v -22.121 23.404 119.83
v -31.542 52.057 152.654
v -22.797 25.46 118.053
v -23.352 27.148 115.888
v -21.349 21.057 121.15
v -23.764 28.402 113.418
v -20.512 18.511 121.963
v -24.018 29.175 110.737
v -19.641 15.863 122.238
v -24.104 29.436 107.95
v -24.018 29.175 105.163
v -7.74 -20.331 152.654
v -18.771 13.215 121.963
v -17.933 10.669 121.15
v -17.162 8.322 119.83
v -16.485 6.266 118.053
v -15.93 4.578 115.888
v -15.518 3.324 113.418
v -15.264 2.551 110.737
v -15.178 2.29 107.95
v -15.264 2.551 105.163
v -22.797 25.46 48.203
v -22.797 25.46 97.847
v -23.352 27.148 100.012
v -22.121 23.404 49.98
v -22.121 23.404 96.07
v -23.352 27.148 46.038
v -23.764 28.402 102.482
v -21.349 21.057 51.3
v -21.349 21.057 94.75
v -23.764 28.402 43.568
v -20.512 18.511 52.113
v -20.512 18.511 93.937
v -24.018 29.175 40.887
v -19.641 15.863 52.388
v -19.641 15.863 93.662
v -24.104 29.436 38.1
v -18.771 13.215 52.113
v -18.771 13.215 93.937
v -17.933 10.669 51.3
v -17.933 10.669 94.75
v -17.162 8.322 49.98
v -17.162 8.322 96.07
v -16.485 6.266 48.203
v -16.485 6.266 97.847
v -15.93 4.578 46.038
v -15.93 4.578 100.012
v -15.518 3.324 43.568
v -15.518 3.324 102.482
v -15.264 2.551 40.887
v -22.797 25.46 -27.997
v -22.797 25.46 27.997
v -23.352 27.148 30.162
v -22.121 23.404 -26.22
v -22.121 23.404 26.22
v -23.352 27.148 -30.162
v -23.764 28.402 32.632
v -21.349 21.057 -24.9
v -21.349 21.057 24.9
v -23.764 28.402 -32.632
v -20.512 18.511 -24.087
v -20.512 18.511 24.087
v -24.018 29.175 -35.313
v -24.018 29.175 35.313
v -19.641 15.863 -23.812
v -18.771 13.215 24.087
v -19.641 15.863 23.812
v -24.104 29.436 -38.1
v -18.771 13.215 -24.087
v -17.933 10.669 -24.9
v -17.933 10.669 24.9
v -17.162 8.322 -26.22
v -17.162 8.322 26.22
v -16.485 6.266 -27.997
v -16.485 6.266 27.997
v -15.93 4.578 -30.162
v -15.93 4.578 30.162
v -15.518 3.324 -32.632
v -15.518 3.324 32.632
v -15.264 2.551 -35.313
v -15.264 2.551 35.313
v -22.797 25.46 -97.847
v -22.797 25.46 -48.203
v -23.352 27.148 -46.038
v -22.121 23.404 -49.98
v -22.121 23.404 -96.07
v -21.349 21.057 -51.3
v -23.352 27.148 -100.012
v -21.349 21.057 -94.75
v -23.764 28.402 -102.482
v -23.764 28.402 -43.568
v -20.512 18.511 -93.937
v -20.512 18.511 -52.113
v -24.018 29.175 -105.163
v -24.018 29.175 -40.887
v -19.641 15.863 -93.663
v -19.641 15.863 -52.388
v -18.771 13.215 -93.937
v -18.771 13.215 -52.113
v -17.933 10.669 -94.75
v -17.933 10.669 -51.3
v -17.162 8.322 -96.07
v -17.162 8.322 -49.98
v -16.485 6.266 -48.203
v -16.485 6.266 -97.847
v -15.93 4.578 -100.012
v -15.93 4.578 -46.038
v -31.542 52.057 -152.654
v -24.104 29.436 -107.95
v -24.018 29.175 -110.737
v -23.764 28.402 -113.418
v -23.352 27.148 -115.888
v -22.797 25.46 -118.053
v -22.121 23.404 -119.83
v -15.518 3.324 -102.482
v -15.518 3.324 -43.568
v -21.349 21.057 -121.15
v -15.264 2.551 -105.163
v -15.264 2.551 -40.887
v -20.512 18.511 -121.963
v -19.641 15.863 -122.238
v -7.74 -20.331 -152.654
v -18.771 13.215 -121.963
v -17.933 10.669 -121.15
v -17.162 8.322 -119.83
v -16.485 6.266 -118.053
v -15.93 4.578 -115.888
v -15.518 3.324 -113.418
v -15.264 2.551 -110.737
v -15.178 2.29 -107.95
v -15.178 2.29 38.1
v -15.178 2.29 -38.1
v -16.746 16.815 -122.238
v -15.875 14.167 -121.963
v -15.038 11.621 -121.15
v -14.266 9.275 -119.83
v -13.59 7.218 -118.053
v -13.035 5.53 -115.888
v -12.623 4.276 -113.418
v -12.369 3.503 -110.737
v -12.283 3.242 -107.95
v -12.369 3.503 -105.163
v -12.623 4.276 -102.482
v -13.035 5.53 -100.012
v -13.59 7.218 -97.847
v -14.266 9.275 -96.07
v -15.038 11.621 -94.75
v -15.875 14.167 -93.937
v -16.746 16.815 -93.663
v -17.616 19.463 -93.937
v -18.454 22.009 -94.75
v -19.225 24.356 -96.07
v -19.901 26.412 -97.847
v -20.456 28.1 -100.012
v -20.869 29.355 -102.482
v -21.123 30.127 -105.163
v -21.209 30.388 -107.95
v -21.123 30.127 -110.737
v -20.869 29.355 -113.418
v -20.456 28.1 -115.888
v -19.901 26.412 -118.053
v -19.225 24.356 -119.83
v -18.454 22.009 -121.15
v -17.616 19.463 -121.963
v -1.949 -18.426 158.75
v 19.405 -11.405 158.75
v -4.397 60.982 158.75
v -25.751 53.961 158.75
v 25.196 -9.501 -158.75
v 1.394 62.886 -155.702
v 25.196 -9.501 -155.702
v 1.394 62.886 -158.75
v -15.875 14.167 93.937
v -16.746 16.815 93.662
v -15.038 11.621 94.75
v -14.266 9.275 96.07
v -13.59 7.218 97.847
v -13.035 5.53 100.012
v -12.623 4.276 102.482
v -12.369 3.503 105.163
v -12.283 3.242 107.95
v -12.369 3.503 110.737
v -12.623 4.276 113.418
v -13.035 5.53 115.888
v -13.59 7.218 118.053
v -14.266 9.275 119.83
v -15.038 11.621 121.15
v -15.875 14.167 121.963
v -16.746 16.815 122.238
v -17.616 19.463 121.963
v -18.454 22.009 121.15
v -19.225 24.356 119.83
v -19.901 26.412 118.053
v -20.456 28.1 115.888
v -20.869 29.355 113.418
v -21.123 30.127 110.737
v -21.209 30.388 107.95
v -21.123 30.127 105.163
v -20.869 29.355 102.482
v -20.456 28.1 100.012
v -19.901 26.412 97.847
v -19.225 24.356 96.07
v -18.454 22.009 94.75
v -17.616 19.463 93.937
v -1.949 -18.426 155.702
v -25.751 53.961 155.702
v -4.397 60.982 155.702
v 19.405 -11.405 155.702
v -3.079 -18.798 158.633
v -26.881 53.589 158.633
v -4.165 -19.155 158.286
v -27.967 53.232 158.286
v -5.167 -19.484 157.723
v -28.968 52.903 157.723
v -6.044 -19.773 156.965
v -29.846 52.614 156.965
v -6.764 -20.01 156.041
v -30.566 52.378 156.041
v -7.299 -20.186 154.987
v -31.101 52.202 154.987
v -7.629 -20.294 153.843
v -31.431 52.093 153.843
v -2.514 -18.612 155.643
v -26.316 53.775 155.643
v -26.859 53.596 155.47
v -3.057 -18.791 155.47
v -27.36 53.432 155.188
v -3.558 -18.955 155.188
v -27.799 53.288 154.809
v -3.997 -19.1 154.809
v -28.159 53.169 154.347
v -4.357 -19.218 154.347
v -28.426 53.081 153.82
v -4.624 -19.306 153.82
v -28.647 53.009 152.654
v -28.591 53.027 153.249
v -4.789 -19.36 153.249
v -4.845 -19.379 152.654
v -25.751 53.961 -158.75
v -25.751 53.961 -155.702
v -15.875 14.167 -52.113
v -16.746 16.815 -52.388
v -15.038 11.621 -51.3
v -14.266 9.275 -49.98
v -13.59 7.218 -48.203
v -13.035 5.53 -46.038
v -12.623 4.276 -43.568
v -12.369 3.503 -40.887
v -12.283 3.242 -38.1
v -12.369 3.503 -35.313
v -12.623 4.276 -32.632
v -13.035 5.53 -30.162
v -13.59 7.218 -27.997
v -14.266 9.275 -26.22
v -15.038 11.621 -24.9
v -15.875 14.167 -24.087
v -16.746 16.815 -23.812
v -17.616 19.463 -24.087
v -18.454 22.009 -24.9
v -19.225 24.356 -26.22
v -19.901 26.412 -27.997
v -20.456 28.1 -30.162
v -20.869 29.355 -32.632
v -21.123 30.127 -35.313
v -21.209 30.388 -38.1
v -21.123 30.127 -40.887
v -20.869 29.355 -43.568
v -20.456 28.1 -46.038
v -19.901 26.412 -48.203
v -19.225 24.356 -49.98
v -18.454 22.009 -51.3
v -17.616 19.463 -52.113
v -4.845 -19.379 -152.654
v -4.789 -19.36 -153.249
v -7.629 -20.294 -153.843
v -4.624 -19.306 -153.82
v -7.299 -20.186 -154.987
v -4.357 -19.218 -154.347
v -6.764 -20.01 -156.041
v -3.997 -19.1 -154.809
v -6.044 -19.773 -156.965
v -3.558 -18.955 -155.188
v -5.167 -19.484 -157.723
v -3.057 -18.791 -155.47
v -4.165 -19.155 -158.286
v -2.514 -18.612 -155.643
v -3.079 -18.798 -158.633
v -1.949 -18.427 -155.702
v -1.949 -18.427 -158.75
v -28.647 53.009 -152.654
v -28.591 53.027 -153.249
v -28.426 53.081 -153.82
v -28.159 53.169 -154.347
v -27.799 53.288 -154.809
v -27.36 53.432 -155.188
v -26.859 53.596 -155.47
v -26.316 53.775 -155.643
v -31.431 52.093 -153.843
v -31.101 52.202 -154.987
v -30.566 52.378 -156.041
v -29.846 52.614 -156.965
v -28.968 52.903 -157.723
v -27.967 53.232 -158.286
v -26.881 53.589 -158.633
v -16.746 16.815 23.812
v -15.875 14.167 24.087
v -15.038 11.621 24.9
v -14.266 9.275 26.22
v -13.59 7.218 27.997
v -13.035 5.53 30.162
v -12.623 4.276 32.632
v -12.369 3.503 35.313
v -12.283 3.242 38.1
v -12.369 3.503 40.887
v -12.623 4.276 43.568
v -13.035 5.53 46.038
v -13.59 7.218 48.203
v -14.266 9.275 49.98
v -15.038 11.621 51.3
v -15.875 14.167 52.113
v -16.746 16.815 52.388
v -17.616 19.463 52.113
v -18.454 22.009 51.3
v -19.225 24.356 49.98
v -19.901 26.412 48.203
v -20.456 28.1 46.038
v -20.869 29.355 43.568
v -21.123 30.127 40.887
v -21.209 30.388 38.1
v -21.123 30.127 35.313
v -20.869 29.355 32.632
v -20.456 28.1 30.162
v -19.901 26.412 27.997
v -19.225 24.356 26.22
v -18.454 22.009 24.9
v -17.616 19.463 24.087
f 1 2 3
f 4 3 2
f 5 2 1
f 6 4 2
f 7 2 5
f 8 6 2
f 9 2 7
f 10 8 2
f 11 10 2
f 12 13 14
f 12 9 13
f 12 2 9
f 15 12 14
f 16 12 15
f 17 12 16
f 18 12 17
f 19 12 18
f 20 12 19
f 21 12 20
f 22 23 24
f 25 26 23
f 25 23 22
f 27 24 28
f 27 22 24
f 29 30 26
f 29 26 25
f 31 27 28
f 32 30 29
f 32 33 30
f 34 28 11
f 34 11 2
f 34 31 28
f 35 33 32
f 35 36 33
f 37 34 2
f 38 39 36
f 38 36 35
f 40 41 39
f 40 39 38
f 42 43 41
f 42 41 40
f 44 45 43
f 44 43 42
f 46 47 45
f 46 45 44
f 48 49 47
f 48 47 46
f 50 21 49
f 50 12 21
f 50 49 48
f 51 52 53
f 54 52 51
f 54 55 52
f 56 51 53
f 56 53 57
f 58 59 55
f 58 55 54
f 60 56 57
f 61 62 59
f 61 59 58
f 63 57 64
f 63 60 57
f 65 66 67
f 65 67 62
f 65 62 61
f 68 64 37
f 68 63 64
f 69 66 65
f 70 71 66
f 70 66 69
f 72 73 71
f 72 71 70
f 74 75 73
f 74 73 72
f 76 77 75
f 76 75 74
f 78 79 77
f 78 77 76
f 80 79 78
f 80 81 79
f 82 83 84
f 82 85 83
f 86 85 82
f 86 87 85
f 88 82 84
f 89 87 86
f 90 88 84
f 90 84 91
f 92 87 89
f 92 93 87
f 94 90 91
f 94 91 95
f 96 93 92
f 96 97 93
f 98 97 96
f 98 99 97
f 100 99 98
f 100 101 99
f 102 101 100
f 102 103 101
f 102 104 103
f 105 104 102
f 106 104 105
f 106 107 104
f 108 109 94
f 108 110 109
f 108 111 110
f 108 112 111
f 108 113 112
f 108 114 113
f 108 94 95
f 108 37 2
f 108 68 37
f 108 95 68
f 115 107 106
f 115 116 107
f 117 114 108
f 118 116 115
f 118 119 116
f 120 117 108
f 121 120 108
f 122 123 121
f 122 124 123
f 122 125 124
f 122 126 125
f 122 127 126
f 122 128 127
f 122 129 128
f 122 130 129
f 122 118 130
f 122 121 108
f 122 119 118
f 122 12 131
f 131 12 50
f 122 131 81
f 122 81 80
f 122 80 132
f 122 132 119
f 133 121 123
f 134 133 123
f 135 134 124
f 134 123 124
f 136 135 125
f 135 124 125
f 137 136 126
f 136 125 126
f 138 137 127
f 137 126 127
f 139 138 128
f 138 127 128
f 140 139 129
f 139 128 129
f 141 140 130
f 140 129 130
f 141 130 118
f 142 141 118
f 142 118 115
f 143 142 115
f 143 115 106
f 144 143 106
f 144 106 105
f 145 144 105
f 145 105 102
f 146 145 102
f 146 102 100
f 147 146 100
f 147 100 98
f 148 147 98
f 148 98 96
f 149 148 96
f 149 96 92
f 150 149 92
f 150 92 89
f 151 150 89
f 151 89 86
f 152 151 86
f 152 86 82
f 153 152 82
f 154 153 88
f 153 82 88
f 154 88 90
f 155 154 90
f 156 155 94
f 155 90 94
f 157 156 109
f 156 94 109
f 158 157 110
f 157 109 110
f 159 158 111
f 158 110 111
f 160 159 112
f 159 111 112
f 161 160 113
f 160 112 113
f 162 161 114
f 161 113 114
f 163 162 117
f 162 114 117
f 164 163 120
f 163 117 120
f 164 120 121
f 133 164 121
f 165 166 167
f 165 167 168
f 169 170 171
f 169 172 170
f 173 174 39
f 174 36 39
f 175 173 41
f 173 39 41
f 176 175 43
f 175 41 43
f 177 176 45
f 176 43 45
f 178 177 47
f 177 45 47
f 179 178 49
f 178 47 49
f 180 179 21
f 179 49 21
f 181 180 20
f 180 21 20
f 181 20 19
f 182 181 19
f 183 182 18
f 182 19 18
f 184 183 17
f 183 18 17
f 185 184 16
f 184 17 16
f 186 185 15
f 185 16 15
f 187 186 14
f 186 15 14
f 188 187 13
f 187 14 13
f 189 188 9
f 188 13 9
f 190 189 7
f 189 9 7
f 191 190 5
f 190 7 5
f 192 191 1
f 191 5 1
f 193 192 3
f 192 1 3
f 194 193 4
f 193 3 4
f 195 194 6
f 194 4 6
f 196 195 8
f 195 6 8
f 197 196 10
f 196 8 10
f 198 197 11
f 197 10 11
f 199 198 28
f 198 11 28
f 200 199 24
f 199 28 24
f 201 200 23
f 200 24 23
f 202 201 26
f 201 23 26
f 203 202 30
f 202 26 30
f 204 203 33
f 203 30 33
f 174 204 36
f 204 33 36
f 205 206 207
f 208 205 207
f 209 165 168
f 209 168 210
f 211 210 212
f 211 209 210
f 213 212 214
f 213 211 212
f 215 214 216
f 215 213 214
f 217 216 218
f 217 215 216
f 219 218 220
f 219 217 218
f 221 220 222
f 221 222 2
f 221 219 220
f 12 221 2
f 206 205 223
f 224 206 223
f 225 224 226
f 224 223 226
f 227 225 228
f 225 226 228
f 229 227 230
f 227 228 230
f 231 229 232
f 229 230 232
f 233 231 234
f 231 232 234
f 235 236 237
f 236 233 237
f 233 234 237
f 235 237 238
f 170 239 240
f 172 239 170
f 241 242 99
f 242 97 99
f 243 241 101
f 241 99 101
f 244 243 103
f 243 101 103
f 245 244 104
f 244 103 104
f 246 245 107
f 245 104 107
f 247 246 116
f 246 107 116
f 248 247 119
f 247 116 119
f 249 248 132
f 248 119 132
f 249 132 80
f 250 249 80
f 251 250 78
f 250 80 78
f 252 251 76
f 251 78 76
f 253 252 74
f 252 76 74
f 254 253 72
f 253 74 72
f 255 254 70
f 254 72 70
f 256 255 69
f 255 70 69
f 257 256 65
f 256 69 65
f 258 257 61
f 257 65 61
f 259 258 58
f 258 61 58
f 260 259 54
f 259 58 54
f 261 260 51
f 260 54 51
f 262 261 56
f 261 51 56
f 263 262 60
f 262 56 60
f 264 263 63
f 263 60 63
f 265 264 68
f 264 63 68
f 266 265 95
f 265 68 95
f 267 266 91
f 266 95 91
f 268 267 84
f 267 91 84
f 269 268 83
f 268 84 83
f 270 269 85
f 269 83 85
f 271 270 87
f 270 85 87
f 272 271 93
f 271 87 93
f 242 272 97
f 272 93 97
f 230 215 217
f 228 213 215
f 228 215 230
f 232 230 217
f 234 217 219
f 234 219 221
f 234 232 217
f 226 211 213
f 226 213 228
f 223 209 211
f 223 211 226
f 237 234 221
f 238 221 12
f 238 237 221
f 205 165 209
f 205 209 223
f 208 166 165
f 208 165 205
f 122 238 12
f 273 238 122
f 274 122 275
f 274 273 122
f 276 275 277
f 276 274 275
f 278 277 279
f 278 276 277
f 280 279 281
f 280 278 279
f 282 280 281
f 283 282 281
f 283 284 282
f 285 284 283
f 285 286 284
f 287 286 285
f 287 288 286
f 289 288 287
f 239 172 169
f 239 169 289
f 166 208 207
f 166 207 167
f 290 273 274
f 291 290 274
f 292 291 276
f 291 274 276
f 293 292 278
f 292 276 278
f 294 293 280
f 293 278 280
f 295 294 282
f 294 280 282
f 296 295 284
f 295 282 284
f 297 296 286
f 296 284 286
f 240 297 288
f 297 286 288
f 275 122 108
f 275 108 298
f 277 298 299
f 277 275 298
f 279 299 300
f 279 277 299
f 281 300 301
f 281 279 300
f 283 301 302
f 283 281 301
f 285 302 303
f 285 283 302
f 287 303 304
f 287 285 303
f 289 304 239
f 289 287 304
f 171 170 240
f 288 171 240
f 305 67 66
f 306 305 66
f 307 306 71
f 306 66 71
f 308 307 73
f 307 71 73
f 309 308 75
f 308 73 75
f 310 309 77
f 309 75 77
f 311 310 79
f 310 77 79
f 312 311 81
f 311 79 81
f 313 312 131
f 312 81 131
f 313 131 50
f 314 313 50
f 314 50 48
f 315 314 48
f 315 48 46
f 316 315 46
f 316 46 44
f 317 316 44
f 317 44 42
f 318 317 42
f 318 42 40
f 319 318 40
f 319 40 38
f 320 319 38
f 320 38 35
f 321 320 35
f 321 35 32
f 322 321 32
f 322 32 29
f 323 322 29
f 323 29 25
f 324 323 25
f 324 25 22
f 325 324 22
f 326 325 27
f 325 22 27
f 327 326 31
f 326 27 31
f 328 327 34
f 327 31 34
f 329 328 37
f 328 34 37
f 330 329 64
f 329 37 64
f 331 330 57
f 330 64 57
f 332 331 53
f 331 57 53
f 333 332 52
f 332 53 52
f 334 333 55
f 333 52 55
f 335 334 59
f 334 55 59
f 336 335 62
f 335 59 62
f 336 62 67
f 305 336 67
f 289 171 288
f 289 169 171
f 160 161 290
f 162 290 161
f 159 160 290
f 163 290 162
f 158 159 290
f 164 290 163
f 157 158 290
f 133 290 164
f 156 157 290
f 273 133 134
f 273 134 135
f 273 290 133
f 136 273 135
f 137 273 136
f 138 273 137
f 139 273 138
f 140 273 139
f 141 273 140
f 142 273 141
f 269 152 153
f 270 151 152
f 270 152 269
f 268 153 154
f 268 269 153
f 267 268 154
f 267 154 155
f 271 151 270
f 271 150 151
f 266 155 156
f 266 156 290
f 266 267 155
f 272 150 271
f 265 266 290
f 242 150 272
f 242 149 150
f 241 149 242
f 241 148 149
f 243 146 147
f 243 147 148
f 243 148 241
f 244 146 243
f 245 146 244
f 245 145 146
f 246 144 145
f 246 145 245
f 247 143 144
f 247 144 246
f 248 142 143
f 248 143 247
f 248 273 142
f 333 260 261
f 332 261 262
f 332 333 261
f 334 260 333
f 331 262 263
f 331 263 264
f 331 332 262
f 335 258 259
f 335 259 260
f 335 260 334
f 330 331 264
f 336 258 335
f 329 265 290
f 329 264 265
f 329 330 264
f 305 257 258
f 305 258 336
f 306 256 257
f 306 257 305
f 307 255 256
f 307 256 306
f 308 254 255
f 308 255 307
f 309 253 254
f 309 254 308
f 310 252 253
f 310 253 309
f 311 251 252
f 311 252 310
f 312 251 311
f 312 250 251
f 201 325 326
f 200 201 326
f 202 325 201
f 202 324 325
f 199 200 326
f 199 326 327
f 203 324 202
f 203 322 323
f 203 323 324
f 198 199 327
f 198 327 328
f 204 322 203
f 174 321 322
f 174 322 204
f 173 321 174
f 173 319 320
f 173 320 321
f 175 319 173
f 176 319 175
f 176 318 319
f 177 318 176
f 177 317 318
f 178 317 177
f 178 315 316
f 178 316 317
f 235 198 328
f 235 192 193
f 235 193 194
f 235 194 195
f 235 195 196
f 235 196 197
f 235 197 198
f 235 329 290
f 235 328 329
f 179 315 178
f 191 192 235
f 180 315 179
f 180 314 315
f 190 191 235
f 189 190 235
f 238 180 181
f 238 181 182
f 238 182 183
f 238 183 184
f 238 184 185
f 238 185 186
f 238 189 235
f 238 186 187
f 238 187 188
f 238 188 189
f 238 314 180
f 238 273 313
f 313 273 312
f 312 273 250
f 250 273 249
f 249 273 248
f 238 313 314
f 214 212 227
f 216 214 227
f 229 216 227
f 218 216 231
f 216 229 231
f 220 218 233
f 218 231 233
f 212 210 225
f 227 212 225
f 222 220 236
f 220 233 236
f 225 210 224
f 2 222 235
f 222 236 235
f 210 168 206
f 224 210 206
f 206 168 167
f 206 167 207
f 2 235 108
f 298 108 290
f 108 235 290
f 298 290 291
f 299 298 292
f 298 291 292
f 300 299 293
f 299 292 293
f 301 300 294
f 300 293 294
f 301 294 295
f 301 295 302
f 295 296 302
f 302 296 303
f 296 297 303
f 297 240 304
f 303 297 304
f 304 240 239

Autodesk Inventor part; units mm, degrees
ref_plane "YZ Plane" through (0, 0, 0) normal (1, 0, 0) x (0, 1, 0)
ref_plane "XZ Plane" through (0, 0, 0) normal (0, 1, 0) x (-1, 0, 0)
ref_plane "XY Plane" through (0, 0, 0) normal (0, 0, 1) x (1, 0, 0)
ref_plane "Work Plane1" through (231.2168, -695.9876, -158.75) normal (0, 0, 1) x (-0.9997801, -0.0209692, 0)
sketch "Sketch1" plane through (231.2168, -695.9876, -158.75) normal (0, 0, 1) x (-0.9997801, -0.0209692, 0)
  line L0 (191.5805, -690.6559) -> (218.9069, -682.3014)
  line L1 (218.9069, -682.3014) -> (241.1856, -755.1718)
  line L2 (241.1856, -755.1718) -> (213.8592, -763.5264)
  line L3 (213.8592, -763.5264) -> (191.5805, -690.6559)
  arc A0 (211.507, -928.635) -> (222.8439, -923.2276) centre (216.7713, -925.0841) ccw
  line L4 (203.7328, -860.718) -> (222.8439, -923.2276)
  arc A1 (207.9488, -852.7889) -> (203.7328, -860.718) centre (209.8053, -858.8615) ccw
  line L5 (232.2389, -845.3627) -> (207.9488, -852.7889)
  arc A2 (240.168, -849.5787) -> (232.2389, -845.3627) centre (234.0955, -851.4352) ccw
  line L6 (288.8094, -1008.6774) -> (240.168, -849.5787)
  arc A3 (288.8094, -1008.6774) -> (289.6175, -1010.3717) centre (294.8819, -1006.8208) ccw
  line L7 (308.7826, -1038.7851) -> (289.6175, -1010.3717)
  arc A4 (308.7826, -1038.7851) -> (317.5979, -1040.4986) centre (314.047, -1035.2342) ccw
  line L8 (596.6104, -852.3023) -> (317.5979, -1040.4986)
  line L9 (312.5405, -431.1512) -> (596.6104, -852.3023)
  line L10 (95.3316, -577.6604) -> (312.5405, -431.1512)
  arc A5 (95.3316, -577.6604) -> (92.8099, -584.7814) centre (98.8825, -582.9248) ccw
  line L11 (186.4087, -890.9291) -> (92.8099, -584.7814)
  arc A6 (186.4087, -890.9291) -> (187.2168, -892.6234) centre (192.4812, -889.0725) ccw
  line L12 (211.507, -928.635) -> (187.2168, -892.6234)
  line L13 (151.3976, -689.5372) -> (192.5934, -824.2828)
  arc A7 (155.6135, -681.6081) -> (151.3976, -689.5372) centre (157.4701, -687.6806) ccw
  line L14 (179.9037, -674.1818) -> (155.6135, -681.6081)
  arc A8 (187.8328, -678.3978) -> (179.9037, -674.1818) centre (181.7602, -680.2544) ccw
  line L15 (229.0286, -813.1435) -> (187.8328, -678.3978)
  arc A9 (224.8127, -821.0726) -> (229.0286, -813.1435) centre (222.9561, -815) ccw
  line L16 (200.5225, -828.4988) -> (224.8127, -821.0726)
  arc A10 (192.5934, -824.2828) -> (200.5225, -828.4988) centre (198.666, -822.4263) ccw
  arc A11 (140.2582, -653.102) -> (148.1873, -657.3179) centre (146.3307, -651.2454) ccw
  line L17 (122.5952, -595.3289) -> (140.2582, -653.102)
  arc A12 (125.1168, -588.2079) -> (122.5952, -595.3289) centre (128.6677, -593.4723) ccw
  line L18 (147.1366, -573.3554) -> (125.1168, -588.2079)
  arc A13 (156.76, -576.7633) -> (147.1366, -573.3554) centre (150.6874, -578.6198) ccw
  line L19 (176.6934, -641.9626) -> (156.76, -576.7633)
  arc A14 (172.4774, -649.8917) -> (176.6934, -641.9626) centre (170.6209, -643.8192) ccw
  line L20 (148.1873, -657.3179) -> (172.4774, -649.8917)
  line L21 (440.6793, -731.4527) -> (242.0503, -738.1789)
  arc A15 (235.844, -729.7287) -> (242.0503, -738.1789) centre (241.8354, -731.8326) ccw
  line L22 (235.844, -729.7287) -> (312.2467, -512.1467)
  arc A16 (323.7318, -511.066) -> (312.2467, -512.1467) centre (318.238, -514.2505) ccw
  line L23 (323.7318, -511.066) -> (445.9582, -721.9218)
  arc A17 (440.6793, -731.4527) -> (445.9582, -721.9218) centre (440.4644, -725.1063) ccw
  line L24 (293.699, -488.3023) -> (226.6453, -679.2602)
  arc A18 (214.5814, -679.0129) -> (226.6453, -679.2602) centre (220.6539, -677.1564) ccw
  line L25 (214.5814, -679.0129) -> (177.6445, -558.1977)
  arc A19 (180.1661, -551.0767) -> (177.6445, -558.1977) centre (183.717, -556.3411) ccw
  line L26 (180.1661, -551.0767) -> (284.1568, -480.9341)
  arc A20 (293.699, -488.3023) -> (284.1568, -480.9341) centre (287.7077, -486.1985) ccw
  line L27 (338.9686, -980.6315) -> (474.0479, -788.3553)
  arc A21 (484.7375, -788.821) -> (474.0479, -788.3553) centre (479.2438, -792.0056) ccw
  line L28 (484.7375, -788.821) -> (526.8957, -861.5491)
  arc A22 (524.9528, -869.998) -> (526.8957, -861.5491) centre (521.4019, -864.7336) ccw
  line L29 (524.9528, -869.998) -> (347.7154, -989.5462)
  arc A23 (338.9686, -980.6315) -> (347.7154, -989.5462) centre (344.1645, -984.2818) ccw
  line L30 (303.3396, -969.3278) -> (242.8789, -771.57)
  arc A24 (248.7366, -763.3671) -> (242.8789, -771.57) centre (248.9515, -769.7134) ccw
  line L31 (248.7366, -763.3671) -> (452.9866, -756.4505)
  arc A25 (458.3974, -766.4471) -> (452.9866, -756.4505) centre (453.2015, -762.7968) ccw
  line L32 (458.3974, -766.4471) -> (314.608, -971.1215)
  arc A26 (303.3396, -969.3278) -> (314.608, -971.1215) centre (309.4121, -967.4712) ccw
  line L33 (215.2197, -740.1923) -> (205.7566, -709.24)
  line L34 (210.4881, -724.7162) -> (230.0462, -718.7366) construction
  point P0 (216.5716, -700.683)
  dimension "d0" = 76.2
  dimension "d27" = 28.575
extrude "Plate1" add sketch "Sketch1" along normal blind 3.048 contours L0 A18 L1 L2 L3 | L0 L1 A18
sketch "Sketch2" plane through (-4.8448, -19.3786, -152.654) normal (-0.9499637, -0.3123604, 0) x (0.3123604, -0.9499637, 0)
  line L0 (-76.2, 0) -> (0, 0)
  line L1 (0, 0) -> (0, 311.404)
  line L2 (0, 311.404) -> (-76.2, 311.404)
  line L3 (-76.2, 311.404) -> (-76.2, 0)
edge flange "Flange1" height 317.5 angle 90 thickness 3.048 bend radius 3.048 thickness toward (-0.9499637, -0.3123604, 0) relief tear relief width 3.048 relief depth 1.524 edges at (-13.8502, 17.7671, -155.702) wall of the first edge with corners at (-28.6466, 53.0087, -152.654) (-4.8448, -19.3786, -152.654) (-4.8448, -19.3786, 158.75) (-28.6466, 53.0087, 158.75)
bend "Bend1"
corner "Corner1"
sketch "Sketch3" plane through (-7.7403, -20.3306, 155.702) normal (0, 0, 1) x (1, 0, 0)
  line L0 (-23.8019, 72.3872) -> (0, 0)
  line L1 (0, 0) -> (27.1452, 8.9257)
  line L2 (27.1452, 8.9257) -> (3.3434, 81.3129)
  line L3 (3.3434, 81.3129) -> (-23.8019, 72.3872)
edge flange "Flange2" height 28.575 angle 90 thickness 3.048 bend radius 3.048 thickness toward (0, 0, 1) relief tear relief width 3.048 relief depth 1.524 edges at (-16.7457, 16.815, 158.75) wall of the first edge with corners at (-31.5421, 52.0566, 155.702) (-7.7403, -20.3306, 155.702) (19.4049, -11.4049, 155.702) (-4.3969, 60.9823, 155.702)
bend "Bend2"
corner "Corner2"
sketch "Sketch4" plane through (-31.5421, 52.0566, 152.654) normal (-0.9499637, -0.3123604, 0) x (0, 0, -1)
  line L0 (-6.096, 80.617) -> (-6.096, -4.417)
  line L1 (-6.096, 38.1) -> (311.404, 38.1) construction
  line L2 (311.404, 74.4136) -> (311.404, 1.7864)
  circle A0 centre (44.704, 38.1) radius 31.75
  circle A1 centre (114.554, 38.1) radius 38.1
  circle A2 centre (190.754, 38.1) radius 38.1
  circle A3 centre (260.604, 38.1) radius 31.75
  circle A4 centre (44.704, 38.1) radius 16.2087 construction
  circle A5 centre (260.604, 38.1) radius 16.2087 construction
  circle A6 centre (44.704, 38.1) radius 14.2875
  circle A7 centre (114.554, 38.1) radius 14.2875
  circle A8 centre (190.754, 38.1) radius 14.2875
  circle A9 centre (260.604, 38.1) radius 14.2875
  line L3 (-6.096, 0) -> (-6.096, 76.2) projected
  line L4 (311.404, 0) -> (311.404, 76.2) projected
  line L5 (44.704, 38.1) -> (-6.096, 38.1) construction
  line L6 (260.604, 38.1) -> (311.404, 38.1) construction
  dimension "d22" = 28.575
  dimension "d23" = 63.5
  dimension "d28" = 76.2
extrude "Cut1" cut sketch "Sketch4" against normal blind 3.048 contours A6 | A7 | A8 | A9
equation "\"d25\" = Thickness"
equation "\"d1\" = Thickness"
equation "\"d2\" = BendReliefWidth"
equation "\"d3\" = BendReliefDepth"
equation "\"d4\" = MinimumRemnant"
equation "\"d5\" = TransitionRadius"
equation "\"d8\" = BendRadius"
equation "\"d9\" = CornerReliefSize"
equation "\"d10\" = GapSize"
equation "\"d11\" = JacobiRadiusSize"
equation "\"d12\" = BendReliefWidth"
equation "\"d13\" = BendReliefDepth"
equation "\"d14\" = MinimumRemnant"
equation "\"d15\" = TransitionRadius"
equation "\"d18\" = BendRadius"
equation "\"d19\" = CornerReliefSize"
equation "\"d20\" = GapSize"
equation "\"d21\" = JacobiRadiusSize"
equation "\"BendRadius\" = Thickness"
equation "\"BendReliefWidth\" = Thickness"
equation "\"BendReliefDepth\" = 0.5 * Thickness"
equation "\"CornerReliefSize\" = 4 * Thickness"
equation "\"MinimumRemnant\" = 2 * Thickness"
equation "\"TransitionRadius\" = BendRadius"
equation "\"JacobiRadiusSize\" = BendRadius"
equation "\"GapSize\" = Thickness"
equation "\"Thickness\" = 3.048"
properties part number "GearBracket"
